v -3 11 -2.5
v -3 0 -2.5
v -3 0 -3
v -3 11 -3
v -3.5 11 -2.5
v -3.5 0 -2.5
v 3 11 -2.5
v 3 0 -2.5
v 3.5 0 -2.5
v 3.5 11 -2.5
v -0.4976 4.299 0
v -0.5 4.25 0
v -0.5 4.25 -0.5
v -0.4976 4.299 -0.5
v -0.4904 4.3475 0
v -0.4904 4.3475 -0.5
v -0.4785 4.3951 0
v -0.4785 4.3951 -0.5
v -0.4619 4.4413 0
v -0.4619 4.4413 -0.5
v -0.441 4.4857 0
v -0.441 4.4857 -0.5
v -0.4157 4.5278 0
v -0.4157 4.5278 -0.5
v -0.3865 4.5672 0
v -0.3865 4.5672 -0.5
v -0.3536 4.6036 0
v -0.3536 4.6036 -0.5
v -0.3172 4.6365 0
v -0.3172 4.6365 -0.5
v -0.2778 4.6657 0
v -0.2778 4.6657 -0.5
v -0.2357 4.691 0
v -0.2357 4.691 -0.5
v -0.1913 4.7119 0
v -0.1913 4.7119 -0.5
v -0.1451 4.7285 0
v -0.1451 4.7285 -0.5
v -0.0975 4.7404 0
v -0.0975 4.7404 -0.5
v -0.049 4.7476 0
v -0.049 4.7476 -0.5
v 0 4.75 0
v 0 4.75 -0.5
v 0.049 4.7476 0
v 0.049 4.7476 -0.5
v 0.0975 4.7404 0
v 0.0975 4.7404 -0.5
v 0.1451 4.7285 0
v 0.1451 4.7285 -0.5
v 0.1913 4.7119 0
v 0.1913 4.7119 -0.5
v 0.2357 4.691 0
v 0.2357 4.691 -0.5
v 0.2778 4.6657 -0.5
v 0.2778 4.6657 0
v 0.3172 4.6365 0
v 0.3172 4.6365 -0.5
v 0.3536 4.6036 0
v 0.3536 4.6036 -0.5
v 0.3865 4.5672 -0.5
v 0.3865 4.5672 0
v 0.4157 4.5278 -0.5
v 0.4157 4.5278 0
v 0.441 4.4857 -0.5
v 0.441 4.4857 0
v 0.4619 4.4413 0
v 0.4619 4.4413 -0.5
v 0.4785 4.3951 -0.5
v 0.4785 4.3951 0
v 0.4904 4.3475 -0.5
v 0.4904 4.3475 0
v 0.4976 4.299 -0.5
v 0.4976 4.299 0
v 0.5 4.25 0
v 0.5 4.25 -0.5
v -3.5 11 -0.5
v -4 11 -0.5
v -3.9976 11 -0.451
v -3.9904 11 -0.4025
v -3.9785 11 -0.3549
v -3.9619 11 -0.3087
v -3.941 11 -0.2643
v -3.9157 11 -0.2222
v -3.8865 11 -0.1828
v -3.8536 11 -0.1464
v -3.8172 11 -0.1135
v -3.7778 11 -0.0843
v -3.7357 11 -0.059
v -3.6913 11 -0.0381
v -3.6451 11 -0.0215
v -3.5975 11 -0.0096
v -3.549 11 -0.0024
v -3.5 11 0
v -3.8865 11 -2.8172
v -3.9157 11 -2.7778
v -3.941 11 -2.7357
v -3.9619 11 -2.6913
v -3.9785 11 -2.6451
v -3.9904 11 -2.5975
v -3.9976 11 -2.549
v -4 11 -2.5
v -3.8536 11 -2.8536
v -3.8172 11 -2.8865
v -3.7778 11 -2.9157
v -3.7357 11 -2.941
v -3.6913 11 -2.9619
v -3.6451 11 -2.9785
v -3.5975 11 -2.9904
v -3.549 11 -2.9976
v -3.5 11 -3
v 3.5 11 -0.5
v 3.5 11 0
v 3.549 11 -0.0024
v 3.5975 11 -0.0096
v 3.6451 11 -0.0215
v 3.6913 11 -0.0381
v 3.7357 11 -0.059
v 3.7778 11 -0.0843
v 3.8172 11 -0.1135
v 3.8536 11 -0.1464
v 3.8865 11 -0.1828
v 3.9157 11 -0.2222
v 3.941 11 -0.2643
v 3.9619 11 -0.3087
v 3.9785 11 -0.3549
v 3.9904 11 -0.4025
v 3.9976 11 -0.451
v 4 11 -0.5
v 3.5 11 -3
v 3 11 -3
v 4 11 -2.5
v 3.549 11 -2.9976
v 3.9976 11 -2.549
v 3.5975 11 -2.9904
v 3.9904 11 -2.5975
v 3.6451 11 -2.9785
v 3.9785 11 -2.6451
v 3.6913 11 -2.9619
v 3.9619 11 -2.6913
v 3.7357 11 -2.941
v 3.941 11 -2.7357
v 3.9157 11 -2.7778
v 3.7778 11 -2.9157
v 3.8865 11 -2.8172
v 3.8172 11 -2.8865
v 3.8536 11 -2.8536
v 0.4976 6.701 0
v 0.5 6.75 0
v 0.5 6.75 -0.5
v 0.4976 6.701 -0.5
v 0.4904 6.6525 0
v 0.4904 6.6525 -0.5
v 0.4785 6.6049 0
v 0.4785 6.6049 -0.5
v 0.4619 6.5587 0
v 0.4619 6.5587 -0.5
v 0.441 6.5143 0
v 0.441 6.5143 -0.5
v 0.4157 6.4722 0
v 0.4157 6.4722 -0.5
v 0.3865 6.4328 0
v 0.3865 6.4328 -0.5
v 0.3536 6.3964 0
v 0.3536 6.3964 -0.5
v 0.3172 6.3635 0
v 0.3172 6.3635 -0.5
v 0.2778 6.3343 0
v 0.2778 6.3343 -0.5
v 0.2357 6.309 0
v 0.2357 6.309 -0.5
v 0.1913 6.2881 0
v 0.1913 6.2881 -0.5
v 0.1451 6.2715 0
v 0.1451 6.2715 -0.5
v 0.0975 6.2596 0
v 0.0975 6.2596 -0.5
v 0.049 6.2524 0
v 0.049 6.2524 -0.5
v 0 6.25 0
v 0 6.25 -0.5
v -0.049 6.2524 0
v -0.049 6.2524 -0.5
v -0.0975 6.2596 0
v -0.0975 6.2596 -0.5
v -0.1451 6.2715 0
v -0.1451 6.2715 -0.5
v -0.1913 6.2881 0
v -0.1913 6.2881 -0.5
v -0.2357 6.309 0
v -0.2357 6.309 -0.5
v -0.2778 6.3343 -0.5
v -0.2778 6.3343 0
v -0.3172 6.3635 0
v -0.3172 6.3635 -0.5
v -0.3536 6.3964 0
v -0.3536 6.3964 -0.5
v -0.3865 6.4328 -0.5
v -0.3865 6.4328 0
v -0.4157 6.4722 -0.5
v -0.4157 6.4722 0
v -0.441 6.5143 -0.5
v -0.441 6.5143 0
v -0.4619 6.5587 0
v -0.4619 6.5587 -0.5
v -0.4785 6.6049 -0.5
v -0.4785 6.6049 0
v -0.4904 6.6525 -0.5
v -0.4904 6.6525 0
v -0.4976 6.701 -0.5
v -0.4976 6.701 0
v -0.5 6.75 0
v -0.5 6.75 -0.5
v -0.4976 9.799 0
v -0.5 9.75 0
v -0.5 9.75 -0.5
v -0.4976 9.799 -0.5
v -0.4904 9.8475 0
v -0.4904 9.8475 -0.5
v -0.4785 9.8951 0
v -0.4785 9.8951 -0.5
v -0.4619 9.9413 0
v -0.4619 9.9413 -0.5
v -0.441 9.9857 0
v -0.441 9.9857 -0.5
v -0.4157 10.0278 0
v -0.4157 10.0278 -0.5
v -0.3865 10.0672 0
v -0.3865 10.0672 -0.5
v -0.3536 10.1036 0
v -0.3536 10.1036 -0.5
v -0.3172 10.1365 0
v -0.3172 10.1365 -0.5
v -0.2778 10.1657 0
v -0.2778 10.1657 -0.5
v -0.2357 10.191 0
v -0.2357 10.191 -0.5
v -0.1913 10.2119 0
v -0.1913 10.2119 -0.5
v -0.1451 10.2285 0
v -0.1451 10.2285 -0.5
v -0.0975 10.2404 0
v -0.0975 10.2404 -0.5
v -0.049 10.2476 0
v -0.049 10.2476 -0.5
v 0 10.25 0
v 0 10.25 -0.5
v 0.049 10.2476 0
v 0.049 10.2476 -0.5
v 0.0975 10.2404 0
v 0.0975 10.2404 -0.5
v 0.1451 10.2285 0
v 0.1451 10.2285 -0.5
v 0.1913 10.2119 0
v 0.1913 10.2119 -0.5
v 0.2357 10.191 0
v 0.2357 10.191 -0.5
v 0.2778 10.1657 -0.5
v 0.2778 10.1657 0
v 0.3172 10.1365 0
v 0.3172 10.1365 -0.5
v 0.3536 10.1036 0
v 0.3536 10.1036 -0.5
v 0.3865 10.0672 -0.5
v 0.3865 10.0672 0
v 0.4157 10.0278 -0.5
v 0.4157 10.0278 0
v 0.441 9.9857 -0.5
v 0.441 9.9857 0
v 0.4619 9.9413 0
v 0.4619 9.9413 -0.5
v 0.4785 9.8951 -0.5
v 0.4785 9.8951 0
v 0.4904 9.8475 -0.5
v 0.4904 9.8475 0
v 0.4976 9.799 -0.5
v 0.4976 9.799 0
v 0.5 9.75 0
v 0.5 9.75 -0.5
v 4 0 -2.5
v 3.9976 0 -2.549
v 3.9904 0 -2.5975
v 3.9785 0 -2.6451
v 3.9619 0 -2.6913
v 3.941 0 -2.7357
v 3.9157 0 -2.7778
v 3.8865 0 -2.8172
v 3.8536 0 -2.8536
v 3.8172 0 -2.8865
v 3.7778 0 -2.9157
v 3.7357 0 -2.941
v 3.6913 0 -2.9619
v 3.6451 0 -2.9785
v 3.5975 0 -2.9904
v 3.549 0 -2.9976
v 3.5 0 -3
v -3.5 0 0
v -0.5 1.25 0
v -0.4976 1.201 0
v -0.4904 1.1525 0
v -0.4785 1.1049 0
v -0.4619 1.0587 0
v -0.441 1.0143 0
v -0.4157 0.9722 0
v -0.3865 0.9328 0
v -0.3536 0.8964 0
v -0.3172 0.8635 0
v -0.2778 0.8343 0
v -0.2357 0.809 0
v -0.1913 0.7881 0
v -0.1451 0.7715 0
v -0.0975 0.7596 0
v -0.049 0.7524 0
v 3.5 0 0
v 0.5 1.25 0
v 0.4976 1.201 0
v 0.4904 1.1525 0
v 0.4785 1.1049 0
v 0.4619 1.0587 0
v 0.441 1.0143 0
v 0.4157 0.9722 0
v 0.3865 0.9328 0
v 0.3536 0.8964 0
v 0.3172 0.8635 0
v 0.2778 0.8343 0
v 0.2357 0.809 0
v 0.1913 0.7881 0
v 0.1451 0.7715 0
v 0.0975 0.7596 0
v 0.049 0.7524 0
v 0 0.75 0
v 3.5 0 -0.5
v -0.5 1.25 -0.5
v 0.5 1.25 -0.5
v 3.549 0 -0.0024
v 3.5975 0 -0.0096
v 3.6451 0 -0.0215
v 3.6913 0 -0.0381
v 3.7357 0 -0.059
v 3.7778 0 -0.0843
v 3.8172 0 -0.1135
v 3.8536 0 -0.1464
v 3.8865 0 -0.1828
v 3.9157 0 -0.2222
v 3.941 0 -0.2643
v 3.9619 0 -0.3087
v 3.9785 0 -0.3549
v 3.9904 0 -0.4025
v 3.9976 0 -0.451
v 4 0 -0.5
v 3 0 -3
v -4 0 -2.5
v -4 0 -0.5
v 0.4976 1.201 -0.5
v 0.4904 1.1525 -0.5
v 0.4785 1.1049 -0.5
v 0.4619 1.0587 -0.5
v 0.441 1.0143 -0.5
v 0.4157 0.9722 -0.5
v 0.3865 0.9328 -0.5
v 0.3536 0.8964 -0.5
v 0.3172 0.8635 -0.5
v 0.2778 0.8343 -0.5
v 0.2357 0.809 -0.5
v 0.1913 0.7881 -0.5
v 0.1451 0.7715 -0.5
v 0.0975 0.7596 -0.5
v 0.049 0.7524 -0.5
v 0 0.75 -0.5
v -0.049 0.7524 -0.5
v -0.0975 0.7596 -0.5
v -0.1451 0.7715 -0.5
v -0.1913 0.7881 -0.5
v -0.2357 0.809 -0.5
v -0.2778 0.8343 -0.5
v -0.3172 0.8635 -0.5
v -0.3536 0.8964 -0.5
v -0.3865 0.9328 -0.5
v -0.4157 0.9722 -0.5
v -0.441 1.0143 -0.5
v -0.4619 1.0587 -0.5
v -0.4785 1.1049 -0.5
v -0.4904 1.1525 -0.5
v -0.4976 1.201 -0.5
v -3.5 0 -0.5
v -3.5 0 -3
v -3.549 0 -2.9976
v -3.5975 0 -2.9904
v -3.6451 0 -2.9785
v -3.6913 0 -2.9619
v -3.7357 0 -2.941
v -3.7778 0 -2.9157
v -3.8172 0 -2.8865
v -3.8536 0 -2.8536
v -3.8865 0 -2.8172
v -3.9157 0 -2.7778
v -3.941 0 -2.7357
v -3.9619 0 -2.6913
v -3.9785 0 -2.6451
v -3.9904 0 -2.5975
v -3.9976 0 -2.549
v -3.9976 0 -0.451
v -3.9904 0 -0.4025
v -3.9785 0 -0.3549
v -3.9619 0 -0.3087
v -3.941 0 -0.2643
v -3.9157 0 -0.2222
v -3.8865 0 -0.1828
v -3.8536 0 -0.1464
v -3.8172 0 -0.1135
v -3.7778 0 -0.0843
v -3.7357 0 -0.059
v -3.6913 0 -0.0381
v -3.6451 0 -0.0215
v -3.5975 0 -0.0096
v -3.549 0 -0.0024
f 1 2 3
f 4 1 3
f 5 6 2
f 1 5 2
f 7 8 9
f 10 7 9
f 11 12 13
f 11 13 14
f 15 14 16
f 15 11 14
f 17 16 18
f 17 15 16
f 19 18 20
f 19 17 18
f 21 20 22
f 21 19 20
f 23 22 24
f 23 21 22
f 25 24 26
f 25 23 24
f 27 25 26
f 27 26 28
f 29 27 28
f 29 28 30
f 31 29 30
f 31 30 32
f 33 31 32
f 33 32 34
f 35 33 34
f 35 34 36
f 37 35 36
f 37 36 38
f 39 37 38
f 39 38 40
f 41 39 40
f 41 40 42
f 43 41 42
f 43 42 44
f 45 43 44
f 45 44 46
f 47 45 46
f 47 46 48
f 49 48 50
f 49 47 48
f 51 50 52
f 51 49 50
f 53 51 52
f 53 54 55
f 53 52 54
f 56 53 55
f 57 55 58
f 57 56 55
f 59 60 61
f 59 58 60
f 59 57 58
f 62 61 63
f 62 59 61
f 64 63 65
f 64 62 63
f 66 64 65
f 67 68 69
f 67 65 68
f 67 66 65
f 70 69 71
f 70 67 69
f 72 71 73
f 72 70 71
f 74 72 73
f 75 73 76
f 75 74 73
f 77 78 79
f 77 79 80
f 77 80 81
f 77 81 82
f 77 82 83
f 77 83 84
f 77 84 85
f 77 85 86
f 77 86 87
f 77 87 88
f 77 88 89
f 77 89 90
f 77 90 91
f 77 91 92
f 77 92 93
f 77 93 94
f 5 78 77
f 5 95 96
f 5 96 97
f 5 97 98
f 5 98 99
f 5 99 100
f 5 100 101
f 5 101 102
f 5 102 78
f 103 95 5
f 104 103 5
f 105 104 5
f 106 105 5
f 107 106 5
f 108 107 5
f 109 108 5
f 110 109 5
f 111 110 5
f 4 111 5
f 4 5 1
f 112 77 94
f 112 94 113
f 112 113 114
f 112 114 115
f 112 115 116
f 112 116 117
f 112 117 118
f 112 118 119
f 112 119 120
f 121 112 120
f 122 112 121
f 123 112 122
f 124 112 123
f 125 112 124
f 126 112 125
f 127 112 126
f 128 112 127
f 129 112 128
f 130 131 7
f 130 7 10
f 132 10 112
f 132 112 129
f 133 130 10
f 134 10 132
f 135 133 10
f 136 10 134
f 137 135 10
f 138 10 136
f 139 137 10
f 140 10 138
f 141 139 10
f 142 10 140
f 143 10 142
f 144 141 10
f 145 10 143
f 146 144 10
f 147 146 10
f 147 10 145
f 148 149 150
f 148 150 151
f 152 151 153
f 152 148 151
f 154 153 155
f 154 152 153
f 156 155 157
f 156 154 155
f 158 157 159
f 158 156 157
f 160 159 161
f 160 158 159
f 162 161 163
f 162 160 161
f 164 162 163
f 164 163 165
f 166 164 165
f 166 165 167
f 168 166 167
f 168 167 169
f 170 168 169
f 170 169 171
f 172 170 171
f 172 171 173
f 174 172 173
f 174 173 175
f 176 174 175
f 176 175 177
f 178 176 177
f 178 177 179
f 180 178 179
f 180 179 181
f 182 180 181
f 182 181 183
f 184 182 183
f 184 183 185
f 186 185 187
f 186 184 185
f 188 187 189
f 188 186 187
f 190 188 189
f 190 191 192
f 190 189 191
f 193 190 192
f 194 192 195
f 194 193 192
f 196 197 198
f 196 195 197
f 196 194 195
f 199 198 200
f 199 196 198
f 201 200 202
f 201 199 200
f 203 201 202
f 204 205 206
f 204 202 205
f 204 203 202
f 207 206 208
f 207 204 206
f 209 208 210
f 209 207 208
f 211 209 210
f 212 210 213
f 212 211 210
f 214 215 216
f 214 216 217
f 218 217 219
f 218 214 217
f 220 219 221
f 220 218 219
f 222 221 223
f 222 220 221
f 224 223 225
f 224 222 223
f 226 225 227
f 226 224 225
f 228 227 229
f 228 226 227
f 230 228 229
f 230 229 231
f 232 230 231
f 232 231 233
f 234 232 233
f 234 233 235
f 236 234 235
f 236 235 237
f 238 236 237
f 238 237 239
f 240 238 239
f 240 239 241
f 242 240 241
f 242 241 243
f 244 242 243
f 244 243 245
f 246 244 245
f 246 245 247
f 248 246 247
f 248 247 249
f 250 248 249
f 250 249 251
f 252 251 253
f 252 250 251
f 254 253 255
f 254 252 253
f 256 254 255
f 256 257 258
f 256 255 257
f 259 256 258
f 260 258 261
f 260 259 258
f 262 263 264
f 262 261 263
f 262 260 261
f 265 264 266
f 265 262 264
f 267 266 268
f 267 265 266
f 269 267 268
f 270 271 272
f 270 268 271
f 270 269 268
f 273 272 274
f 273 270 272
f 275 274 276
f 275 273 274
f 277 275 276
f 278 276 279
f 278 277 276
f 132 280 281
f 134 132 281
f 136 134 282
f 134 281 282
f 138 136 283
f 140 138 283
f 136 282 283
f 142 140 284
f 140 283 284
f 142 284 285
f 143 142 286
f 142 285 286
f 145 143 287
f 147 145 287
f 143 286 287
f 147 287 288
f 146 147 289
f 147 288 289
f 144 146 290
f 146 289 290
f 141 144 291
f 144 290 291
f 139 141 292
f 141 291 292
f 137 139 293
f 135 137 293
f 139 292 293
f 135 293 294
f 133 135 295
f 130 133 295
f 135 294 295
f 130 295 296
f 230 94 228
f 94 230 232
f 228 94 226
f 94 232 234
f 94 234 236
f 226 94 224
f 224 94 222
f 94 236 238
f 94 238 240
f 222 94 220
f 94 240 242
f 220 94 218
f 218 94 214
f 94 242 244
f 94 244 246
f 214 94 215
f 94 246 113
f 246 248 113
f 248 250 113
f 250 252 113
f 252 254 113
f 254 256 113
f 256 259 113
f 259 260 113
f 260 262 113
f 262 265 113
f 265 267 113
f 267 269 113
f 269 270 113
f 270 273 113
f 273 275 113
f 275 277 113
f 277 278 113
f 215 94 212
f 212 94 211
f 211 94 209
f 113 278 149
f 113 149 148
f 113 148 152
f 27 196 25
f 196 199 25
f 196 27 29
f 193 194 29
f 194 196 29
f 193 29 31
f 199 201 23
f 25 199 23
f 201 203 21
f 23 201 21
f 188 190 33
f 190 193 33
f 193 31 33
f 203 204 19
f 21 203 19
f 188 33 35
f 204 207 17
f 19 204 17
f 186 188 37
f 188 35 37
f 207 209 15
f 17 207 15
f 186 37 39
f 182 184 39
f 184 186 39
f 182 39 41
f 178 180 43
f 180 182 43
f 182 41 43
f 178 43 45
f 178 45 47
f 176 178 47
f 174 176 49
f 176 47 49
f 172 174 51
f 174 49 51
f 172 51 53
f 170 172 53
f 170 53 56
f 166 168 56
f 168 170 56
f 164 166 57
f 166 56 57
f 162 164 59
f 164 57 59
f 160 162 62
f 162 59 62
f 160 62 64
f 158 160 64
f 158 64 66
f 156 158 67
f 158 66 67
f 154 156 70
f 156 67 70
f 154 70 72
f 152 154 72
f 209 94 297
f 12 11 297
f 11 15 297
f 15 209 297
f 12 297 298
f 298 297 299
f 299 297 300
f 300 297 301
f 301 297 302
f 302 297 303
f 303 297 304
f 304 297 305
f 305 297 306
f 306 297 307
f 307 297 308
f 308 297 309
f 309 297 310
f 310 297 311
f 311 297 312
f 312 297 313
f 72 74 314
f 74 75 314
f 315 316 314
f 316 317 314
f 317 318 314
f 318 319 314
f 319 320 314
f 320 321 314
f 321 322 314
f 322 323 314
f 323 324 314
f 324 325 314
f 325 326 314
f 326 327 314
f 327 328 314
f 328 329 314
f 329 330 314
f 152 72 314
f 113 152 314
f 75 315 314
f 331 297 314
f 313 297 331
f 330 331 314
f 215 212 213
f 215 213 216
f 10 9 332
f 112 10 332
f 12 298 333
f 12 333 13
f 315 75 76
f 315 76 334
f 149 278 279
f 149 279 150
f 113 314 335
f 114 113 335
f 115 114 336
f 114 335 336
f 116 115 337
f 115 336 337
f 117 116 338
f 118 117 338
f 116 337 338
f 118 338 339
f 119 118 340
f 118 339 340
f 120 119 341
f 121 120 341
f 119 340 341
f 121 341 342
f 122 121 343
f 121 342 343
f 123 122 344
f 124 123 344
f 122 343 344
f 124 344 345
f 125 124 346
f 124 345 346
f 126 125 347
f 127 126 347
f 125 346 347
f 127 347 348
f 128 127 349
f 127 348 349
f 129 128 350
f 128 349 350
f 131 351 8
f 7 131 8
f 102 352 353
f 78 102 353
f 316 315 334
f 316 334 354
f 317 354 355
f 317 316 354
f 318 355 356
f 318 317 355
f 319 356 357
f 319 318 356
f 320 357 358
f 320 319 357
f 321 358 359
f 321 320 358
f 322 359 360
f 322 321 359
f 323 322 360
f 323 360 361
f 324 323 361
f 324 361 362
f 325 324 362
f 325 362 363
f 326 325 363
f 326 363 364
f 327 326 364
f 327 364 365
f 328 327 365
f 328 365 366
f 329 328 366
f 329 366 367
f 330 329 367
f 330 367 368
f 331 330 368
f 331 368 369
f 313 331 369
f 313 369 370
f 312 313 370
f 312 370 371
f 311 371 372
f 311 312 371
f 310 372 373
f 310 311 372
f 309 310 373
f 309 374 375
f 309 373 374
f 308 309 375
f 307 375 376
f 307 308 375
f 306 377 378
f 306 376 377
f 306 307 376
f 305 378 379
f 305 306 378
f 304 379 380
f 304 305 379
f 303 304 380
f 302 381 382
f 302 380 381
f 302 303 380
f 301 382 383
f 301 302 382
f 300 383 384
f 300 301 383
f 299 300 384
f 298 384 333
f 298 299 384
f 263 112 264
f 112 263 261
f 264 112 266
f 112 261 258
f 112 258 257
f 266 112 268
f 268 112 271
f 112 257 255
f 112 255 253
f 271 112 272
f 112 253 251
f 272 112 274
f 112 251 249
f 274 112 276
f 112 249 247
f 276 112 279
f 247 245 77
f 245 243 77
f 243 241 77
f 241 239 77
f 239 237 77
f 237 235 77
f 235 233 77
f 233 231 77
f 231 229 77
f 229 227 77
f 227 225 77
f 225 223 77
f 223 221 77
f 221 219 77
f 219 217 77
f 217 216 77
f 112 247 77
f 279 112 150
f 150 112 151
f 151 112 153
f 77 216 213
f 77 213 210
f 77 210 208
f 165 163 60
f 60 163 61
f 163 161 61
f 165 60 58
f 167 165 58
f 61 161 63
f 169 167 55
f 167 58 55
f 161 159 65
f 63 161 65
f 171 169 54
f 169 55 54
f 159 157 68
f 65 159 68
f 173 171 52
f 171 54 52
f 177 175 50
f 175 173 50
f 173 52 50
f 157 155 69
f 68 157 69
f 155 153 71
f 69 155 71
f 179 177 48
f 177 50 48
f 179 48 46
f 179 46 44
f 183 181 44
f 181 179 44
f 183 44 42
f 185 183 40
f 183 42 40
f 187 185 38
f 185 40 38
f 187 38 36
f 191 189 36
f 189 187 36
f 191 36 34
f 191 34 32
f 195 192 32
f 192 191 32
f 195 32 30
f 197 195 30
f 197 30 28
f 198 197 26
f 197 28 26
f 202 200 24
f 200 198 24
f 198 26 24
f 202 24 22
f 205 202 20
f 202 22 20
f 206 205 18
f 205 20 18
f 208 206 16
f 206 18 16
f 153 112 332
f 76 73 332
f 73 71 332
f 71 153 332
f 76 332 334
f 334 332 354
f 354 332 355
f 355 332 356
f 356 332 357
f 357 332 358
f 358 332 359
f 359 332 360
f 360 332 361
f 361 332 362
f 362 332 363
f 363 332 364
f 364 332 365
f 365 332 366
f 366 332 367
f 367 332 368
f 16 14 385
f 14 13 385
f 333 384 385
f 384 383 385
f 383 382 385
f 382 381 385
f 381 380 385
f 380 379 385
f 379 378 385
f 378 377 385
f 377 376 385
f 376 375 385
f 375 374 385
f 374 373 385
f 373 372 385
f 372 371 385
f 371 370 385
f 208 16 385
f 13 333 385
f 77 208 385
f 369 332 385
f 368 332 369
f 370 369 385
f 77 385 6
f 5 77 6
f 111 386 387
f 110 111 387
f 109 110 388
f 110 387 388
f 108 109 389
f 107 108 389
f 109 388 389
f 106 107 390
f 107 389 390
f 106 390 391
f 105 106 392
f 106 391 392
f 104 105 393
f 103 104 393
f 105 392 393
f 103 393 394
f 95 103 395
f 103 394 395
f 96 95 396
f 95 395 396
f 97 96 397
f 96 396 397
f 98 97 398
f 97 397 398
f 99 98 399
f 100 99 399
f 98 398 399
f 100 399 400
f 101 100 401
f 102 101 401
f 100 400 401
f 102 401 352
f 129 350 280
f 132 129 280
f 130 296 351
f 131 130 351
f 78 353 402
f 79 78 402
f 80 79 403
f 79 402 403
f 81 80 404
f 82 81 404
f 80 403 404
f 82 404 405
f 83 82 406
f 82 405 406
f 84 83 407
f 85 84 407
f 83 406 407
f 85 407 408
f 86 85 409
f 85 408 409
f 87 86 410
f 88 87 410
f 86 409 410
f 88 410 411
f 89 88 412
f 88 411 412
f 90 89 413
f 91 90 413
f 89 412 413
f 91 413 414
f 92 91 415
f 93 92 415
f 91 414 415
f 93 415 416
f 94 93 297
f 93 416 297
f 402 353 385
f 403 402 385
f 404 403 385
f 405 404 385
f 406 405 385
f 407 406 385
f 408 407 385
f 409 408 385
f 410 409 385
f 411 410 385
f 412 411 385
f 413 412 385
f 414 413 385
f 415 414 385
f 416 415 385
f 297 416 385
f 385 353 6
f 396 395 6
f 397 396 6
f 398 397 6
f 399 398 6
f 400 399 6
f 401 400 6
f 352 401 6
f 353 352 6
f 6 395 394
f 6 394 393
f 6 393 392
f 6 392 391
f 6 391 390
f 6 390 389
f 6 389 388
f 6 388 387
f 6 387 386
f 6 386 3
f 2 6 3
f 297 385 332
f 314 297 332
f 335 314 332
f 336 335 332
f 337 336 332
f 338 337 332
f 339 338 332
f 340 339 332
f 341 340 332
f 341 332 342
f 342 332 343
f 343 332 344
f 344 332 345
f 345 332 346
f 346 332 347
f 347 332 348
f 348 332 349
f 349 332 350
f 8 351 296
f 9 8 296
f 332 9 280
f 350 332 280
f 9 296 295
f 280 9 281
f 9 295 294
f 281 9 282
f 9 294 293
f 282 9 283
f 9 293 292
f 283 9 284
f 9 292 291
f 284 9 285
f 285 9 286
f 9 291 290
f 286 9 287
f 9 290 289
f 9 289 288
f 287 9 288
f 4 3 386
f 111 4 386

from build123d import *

# Parameters (mm, degrees)
EXTRUDE_THIN1_DEPTH = 11
CUT_EXTRUDE1_DEPTH  = 1


with BuildPart() as part:
    # Sketch1 → Extrude-Thin1 (new body)
    with BuildSketch(Plane(origin=(0, 0, 0), x_dir=(1, 0, 0), z_dir=(0, 1, 0))):
        with BuildLine():
            Line((-3, 3), (-3.5, 3))
            ThreePointArc((-3.5, 3), (-3.853553391, 2.853553391), (-4, 2.5))
            Line((-4, 2.5), (-4, 0.5))
            ThreePointArc((-4, 0.5), (-3.853553391, 0.146446609), (-3.5, 0))
            Line((-3.5, 0), (3.5, 0))
            ThreePointArc((3.5, 0), (3.853553391, 0.146446609), (4, 0.5))
            Line((4, 0.5), (4, 2.5))
            ThreePointArc((4, 2.5), (3.853553391, 2.853553391), (3.5, 3))
            Line((3.5, 3), (3, 3))
            Line((3, 3), (3, 2.5))
            Line((3, 2.5), (3.5, 2.5))
            Line((3.5, 2.5), (3.5, 0.5))
            Line((3.5, 0.5), (-3.5, 0.5))
            Line((-3.5, 0.5), (-3.5, 2.5))
            Line((-3.5, 2.5), (-3, 2.5))
            Line((-3, 2.5), (-3, 3))
        make_face()
    extrude(amount=EXTRUDE_THIN1_DEPTH)

    # Sketch3 → Cut-Extrude1 (cut)
    with BuildSketch(Plane.XY):
        with BuildLine():
            Line((-0.5, 6.75), (-0.5, 9.75))
            ThreePointArc((-0.5, 9.75), (0, 10.25), (0.5, 9.75))
            Line((0.5, 9.75), (0.5, 6.75))
            ThreePointArc((0.5, 6.75), (0, 6.25), (-0.5, 6.75))
        make_face()
        with BuildLine():
            Line((0.5, 4.25), (0.5, 1.25))
            ThreePointArc((0.5, 1.25), (0, 0.75), (-0.5, 1.25))
            Line((-0.5, 1.25), (-0.5, 4.25))
            ThreePointArc((-0.5, 4.25), (0, 4.75), (0.5, 4.25))
        make_face()
    extrude(amount=-CUT_EXTRUDE1_DEPTH, mode=Mode.SUBTRACT)


solid = part.part
